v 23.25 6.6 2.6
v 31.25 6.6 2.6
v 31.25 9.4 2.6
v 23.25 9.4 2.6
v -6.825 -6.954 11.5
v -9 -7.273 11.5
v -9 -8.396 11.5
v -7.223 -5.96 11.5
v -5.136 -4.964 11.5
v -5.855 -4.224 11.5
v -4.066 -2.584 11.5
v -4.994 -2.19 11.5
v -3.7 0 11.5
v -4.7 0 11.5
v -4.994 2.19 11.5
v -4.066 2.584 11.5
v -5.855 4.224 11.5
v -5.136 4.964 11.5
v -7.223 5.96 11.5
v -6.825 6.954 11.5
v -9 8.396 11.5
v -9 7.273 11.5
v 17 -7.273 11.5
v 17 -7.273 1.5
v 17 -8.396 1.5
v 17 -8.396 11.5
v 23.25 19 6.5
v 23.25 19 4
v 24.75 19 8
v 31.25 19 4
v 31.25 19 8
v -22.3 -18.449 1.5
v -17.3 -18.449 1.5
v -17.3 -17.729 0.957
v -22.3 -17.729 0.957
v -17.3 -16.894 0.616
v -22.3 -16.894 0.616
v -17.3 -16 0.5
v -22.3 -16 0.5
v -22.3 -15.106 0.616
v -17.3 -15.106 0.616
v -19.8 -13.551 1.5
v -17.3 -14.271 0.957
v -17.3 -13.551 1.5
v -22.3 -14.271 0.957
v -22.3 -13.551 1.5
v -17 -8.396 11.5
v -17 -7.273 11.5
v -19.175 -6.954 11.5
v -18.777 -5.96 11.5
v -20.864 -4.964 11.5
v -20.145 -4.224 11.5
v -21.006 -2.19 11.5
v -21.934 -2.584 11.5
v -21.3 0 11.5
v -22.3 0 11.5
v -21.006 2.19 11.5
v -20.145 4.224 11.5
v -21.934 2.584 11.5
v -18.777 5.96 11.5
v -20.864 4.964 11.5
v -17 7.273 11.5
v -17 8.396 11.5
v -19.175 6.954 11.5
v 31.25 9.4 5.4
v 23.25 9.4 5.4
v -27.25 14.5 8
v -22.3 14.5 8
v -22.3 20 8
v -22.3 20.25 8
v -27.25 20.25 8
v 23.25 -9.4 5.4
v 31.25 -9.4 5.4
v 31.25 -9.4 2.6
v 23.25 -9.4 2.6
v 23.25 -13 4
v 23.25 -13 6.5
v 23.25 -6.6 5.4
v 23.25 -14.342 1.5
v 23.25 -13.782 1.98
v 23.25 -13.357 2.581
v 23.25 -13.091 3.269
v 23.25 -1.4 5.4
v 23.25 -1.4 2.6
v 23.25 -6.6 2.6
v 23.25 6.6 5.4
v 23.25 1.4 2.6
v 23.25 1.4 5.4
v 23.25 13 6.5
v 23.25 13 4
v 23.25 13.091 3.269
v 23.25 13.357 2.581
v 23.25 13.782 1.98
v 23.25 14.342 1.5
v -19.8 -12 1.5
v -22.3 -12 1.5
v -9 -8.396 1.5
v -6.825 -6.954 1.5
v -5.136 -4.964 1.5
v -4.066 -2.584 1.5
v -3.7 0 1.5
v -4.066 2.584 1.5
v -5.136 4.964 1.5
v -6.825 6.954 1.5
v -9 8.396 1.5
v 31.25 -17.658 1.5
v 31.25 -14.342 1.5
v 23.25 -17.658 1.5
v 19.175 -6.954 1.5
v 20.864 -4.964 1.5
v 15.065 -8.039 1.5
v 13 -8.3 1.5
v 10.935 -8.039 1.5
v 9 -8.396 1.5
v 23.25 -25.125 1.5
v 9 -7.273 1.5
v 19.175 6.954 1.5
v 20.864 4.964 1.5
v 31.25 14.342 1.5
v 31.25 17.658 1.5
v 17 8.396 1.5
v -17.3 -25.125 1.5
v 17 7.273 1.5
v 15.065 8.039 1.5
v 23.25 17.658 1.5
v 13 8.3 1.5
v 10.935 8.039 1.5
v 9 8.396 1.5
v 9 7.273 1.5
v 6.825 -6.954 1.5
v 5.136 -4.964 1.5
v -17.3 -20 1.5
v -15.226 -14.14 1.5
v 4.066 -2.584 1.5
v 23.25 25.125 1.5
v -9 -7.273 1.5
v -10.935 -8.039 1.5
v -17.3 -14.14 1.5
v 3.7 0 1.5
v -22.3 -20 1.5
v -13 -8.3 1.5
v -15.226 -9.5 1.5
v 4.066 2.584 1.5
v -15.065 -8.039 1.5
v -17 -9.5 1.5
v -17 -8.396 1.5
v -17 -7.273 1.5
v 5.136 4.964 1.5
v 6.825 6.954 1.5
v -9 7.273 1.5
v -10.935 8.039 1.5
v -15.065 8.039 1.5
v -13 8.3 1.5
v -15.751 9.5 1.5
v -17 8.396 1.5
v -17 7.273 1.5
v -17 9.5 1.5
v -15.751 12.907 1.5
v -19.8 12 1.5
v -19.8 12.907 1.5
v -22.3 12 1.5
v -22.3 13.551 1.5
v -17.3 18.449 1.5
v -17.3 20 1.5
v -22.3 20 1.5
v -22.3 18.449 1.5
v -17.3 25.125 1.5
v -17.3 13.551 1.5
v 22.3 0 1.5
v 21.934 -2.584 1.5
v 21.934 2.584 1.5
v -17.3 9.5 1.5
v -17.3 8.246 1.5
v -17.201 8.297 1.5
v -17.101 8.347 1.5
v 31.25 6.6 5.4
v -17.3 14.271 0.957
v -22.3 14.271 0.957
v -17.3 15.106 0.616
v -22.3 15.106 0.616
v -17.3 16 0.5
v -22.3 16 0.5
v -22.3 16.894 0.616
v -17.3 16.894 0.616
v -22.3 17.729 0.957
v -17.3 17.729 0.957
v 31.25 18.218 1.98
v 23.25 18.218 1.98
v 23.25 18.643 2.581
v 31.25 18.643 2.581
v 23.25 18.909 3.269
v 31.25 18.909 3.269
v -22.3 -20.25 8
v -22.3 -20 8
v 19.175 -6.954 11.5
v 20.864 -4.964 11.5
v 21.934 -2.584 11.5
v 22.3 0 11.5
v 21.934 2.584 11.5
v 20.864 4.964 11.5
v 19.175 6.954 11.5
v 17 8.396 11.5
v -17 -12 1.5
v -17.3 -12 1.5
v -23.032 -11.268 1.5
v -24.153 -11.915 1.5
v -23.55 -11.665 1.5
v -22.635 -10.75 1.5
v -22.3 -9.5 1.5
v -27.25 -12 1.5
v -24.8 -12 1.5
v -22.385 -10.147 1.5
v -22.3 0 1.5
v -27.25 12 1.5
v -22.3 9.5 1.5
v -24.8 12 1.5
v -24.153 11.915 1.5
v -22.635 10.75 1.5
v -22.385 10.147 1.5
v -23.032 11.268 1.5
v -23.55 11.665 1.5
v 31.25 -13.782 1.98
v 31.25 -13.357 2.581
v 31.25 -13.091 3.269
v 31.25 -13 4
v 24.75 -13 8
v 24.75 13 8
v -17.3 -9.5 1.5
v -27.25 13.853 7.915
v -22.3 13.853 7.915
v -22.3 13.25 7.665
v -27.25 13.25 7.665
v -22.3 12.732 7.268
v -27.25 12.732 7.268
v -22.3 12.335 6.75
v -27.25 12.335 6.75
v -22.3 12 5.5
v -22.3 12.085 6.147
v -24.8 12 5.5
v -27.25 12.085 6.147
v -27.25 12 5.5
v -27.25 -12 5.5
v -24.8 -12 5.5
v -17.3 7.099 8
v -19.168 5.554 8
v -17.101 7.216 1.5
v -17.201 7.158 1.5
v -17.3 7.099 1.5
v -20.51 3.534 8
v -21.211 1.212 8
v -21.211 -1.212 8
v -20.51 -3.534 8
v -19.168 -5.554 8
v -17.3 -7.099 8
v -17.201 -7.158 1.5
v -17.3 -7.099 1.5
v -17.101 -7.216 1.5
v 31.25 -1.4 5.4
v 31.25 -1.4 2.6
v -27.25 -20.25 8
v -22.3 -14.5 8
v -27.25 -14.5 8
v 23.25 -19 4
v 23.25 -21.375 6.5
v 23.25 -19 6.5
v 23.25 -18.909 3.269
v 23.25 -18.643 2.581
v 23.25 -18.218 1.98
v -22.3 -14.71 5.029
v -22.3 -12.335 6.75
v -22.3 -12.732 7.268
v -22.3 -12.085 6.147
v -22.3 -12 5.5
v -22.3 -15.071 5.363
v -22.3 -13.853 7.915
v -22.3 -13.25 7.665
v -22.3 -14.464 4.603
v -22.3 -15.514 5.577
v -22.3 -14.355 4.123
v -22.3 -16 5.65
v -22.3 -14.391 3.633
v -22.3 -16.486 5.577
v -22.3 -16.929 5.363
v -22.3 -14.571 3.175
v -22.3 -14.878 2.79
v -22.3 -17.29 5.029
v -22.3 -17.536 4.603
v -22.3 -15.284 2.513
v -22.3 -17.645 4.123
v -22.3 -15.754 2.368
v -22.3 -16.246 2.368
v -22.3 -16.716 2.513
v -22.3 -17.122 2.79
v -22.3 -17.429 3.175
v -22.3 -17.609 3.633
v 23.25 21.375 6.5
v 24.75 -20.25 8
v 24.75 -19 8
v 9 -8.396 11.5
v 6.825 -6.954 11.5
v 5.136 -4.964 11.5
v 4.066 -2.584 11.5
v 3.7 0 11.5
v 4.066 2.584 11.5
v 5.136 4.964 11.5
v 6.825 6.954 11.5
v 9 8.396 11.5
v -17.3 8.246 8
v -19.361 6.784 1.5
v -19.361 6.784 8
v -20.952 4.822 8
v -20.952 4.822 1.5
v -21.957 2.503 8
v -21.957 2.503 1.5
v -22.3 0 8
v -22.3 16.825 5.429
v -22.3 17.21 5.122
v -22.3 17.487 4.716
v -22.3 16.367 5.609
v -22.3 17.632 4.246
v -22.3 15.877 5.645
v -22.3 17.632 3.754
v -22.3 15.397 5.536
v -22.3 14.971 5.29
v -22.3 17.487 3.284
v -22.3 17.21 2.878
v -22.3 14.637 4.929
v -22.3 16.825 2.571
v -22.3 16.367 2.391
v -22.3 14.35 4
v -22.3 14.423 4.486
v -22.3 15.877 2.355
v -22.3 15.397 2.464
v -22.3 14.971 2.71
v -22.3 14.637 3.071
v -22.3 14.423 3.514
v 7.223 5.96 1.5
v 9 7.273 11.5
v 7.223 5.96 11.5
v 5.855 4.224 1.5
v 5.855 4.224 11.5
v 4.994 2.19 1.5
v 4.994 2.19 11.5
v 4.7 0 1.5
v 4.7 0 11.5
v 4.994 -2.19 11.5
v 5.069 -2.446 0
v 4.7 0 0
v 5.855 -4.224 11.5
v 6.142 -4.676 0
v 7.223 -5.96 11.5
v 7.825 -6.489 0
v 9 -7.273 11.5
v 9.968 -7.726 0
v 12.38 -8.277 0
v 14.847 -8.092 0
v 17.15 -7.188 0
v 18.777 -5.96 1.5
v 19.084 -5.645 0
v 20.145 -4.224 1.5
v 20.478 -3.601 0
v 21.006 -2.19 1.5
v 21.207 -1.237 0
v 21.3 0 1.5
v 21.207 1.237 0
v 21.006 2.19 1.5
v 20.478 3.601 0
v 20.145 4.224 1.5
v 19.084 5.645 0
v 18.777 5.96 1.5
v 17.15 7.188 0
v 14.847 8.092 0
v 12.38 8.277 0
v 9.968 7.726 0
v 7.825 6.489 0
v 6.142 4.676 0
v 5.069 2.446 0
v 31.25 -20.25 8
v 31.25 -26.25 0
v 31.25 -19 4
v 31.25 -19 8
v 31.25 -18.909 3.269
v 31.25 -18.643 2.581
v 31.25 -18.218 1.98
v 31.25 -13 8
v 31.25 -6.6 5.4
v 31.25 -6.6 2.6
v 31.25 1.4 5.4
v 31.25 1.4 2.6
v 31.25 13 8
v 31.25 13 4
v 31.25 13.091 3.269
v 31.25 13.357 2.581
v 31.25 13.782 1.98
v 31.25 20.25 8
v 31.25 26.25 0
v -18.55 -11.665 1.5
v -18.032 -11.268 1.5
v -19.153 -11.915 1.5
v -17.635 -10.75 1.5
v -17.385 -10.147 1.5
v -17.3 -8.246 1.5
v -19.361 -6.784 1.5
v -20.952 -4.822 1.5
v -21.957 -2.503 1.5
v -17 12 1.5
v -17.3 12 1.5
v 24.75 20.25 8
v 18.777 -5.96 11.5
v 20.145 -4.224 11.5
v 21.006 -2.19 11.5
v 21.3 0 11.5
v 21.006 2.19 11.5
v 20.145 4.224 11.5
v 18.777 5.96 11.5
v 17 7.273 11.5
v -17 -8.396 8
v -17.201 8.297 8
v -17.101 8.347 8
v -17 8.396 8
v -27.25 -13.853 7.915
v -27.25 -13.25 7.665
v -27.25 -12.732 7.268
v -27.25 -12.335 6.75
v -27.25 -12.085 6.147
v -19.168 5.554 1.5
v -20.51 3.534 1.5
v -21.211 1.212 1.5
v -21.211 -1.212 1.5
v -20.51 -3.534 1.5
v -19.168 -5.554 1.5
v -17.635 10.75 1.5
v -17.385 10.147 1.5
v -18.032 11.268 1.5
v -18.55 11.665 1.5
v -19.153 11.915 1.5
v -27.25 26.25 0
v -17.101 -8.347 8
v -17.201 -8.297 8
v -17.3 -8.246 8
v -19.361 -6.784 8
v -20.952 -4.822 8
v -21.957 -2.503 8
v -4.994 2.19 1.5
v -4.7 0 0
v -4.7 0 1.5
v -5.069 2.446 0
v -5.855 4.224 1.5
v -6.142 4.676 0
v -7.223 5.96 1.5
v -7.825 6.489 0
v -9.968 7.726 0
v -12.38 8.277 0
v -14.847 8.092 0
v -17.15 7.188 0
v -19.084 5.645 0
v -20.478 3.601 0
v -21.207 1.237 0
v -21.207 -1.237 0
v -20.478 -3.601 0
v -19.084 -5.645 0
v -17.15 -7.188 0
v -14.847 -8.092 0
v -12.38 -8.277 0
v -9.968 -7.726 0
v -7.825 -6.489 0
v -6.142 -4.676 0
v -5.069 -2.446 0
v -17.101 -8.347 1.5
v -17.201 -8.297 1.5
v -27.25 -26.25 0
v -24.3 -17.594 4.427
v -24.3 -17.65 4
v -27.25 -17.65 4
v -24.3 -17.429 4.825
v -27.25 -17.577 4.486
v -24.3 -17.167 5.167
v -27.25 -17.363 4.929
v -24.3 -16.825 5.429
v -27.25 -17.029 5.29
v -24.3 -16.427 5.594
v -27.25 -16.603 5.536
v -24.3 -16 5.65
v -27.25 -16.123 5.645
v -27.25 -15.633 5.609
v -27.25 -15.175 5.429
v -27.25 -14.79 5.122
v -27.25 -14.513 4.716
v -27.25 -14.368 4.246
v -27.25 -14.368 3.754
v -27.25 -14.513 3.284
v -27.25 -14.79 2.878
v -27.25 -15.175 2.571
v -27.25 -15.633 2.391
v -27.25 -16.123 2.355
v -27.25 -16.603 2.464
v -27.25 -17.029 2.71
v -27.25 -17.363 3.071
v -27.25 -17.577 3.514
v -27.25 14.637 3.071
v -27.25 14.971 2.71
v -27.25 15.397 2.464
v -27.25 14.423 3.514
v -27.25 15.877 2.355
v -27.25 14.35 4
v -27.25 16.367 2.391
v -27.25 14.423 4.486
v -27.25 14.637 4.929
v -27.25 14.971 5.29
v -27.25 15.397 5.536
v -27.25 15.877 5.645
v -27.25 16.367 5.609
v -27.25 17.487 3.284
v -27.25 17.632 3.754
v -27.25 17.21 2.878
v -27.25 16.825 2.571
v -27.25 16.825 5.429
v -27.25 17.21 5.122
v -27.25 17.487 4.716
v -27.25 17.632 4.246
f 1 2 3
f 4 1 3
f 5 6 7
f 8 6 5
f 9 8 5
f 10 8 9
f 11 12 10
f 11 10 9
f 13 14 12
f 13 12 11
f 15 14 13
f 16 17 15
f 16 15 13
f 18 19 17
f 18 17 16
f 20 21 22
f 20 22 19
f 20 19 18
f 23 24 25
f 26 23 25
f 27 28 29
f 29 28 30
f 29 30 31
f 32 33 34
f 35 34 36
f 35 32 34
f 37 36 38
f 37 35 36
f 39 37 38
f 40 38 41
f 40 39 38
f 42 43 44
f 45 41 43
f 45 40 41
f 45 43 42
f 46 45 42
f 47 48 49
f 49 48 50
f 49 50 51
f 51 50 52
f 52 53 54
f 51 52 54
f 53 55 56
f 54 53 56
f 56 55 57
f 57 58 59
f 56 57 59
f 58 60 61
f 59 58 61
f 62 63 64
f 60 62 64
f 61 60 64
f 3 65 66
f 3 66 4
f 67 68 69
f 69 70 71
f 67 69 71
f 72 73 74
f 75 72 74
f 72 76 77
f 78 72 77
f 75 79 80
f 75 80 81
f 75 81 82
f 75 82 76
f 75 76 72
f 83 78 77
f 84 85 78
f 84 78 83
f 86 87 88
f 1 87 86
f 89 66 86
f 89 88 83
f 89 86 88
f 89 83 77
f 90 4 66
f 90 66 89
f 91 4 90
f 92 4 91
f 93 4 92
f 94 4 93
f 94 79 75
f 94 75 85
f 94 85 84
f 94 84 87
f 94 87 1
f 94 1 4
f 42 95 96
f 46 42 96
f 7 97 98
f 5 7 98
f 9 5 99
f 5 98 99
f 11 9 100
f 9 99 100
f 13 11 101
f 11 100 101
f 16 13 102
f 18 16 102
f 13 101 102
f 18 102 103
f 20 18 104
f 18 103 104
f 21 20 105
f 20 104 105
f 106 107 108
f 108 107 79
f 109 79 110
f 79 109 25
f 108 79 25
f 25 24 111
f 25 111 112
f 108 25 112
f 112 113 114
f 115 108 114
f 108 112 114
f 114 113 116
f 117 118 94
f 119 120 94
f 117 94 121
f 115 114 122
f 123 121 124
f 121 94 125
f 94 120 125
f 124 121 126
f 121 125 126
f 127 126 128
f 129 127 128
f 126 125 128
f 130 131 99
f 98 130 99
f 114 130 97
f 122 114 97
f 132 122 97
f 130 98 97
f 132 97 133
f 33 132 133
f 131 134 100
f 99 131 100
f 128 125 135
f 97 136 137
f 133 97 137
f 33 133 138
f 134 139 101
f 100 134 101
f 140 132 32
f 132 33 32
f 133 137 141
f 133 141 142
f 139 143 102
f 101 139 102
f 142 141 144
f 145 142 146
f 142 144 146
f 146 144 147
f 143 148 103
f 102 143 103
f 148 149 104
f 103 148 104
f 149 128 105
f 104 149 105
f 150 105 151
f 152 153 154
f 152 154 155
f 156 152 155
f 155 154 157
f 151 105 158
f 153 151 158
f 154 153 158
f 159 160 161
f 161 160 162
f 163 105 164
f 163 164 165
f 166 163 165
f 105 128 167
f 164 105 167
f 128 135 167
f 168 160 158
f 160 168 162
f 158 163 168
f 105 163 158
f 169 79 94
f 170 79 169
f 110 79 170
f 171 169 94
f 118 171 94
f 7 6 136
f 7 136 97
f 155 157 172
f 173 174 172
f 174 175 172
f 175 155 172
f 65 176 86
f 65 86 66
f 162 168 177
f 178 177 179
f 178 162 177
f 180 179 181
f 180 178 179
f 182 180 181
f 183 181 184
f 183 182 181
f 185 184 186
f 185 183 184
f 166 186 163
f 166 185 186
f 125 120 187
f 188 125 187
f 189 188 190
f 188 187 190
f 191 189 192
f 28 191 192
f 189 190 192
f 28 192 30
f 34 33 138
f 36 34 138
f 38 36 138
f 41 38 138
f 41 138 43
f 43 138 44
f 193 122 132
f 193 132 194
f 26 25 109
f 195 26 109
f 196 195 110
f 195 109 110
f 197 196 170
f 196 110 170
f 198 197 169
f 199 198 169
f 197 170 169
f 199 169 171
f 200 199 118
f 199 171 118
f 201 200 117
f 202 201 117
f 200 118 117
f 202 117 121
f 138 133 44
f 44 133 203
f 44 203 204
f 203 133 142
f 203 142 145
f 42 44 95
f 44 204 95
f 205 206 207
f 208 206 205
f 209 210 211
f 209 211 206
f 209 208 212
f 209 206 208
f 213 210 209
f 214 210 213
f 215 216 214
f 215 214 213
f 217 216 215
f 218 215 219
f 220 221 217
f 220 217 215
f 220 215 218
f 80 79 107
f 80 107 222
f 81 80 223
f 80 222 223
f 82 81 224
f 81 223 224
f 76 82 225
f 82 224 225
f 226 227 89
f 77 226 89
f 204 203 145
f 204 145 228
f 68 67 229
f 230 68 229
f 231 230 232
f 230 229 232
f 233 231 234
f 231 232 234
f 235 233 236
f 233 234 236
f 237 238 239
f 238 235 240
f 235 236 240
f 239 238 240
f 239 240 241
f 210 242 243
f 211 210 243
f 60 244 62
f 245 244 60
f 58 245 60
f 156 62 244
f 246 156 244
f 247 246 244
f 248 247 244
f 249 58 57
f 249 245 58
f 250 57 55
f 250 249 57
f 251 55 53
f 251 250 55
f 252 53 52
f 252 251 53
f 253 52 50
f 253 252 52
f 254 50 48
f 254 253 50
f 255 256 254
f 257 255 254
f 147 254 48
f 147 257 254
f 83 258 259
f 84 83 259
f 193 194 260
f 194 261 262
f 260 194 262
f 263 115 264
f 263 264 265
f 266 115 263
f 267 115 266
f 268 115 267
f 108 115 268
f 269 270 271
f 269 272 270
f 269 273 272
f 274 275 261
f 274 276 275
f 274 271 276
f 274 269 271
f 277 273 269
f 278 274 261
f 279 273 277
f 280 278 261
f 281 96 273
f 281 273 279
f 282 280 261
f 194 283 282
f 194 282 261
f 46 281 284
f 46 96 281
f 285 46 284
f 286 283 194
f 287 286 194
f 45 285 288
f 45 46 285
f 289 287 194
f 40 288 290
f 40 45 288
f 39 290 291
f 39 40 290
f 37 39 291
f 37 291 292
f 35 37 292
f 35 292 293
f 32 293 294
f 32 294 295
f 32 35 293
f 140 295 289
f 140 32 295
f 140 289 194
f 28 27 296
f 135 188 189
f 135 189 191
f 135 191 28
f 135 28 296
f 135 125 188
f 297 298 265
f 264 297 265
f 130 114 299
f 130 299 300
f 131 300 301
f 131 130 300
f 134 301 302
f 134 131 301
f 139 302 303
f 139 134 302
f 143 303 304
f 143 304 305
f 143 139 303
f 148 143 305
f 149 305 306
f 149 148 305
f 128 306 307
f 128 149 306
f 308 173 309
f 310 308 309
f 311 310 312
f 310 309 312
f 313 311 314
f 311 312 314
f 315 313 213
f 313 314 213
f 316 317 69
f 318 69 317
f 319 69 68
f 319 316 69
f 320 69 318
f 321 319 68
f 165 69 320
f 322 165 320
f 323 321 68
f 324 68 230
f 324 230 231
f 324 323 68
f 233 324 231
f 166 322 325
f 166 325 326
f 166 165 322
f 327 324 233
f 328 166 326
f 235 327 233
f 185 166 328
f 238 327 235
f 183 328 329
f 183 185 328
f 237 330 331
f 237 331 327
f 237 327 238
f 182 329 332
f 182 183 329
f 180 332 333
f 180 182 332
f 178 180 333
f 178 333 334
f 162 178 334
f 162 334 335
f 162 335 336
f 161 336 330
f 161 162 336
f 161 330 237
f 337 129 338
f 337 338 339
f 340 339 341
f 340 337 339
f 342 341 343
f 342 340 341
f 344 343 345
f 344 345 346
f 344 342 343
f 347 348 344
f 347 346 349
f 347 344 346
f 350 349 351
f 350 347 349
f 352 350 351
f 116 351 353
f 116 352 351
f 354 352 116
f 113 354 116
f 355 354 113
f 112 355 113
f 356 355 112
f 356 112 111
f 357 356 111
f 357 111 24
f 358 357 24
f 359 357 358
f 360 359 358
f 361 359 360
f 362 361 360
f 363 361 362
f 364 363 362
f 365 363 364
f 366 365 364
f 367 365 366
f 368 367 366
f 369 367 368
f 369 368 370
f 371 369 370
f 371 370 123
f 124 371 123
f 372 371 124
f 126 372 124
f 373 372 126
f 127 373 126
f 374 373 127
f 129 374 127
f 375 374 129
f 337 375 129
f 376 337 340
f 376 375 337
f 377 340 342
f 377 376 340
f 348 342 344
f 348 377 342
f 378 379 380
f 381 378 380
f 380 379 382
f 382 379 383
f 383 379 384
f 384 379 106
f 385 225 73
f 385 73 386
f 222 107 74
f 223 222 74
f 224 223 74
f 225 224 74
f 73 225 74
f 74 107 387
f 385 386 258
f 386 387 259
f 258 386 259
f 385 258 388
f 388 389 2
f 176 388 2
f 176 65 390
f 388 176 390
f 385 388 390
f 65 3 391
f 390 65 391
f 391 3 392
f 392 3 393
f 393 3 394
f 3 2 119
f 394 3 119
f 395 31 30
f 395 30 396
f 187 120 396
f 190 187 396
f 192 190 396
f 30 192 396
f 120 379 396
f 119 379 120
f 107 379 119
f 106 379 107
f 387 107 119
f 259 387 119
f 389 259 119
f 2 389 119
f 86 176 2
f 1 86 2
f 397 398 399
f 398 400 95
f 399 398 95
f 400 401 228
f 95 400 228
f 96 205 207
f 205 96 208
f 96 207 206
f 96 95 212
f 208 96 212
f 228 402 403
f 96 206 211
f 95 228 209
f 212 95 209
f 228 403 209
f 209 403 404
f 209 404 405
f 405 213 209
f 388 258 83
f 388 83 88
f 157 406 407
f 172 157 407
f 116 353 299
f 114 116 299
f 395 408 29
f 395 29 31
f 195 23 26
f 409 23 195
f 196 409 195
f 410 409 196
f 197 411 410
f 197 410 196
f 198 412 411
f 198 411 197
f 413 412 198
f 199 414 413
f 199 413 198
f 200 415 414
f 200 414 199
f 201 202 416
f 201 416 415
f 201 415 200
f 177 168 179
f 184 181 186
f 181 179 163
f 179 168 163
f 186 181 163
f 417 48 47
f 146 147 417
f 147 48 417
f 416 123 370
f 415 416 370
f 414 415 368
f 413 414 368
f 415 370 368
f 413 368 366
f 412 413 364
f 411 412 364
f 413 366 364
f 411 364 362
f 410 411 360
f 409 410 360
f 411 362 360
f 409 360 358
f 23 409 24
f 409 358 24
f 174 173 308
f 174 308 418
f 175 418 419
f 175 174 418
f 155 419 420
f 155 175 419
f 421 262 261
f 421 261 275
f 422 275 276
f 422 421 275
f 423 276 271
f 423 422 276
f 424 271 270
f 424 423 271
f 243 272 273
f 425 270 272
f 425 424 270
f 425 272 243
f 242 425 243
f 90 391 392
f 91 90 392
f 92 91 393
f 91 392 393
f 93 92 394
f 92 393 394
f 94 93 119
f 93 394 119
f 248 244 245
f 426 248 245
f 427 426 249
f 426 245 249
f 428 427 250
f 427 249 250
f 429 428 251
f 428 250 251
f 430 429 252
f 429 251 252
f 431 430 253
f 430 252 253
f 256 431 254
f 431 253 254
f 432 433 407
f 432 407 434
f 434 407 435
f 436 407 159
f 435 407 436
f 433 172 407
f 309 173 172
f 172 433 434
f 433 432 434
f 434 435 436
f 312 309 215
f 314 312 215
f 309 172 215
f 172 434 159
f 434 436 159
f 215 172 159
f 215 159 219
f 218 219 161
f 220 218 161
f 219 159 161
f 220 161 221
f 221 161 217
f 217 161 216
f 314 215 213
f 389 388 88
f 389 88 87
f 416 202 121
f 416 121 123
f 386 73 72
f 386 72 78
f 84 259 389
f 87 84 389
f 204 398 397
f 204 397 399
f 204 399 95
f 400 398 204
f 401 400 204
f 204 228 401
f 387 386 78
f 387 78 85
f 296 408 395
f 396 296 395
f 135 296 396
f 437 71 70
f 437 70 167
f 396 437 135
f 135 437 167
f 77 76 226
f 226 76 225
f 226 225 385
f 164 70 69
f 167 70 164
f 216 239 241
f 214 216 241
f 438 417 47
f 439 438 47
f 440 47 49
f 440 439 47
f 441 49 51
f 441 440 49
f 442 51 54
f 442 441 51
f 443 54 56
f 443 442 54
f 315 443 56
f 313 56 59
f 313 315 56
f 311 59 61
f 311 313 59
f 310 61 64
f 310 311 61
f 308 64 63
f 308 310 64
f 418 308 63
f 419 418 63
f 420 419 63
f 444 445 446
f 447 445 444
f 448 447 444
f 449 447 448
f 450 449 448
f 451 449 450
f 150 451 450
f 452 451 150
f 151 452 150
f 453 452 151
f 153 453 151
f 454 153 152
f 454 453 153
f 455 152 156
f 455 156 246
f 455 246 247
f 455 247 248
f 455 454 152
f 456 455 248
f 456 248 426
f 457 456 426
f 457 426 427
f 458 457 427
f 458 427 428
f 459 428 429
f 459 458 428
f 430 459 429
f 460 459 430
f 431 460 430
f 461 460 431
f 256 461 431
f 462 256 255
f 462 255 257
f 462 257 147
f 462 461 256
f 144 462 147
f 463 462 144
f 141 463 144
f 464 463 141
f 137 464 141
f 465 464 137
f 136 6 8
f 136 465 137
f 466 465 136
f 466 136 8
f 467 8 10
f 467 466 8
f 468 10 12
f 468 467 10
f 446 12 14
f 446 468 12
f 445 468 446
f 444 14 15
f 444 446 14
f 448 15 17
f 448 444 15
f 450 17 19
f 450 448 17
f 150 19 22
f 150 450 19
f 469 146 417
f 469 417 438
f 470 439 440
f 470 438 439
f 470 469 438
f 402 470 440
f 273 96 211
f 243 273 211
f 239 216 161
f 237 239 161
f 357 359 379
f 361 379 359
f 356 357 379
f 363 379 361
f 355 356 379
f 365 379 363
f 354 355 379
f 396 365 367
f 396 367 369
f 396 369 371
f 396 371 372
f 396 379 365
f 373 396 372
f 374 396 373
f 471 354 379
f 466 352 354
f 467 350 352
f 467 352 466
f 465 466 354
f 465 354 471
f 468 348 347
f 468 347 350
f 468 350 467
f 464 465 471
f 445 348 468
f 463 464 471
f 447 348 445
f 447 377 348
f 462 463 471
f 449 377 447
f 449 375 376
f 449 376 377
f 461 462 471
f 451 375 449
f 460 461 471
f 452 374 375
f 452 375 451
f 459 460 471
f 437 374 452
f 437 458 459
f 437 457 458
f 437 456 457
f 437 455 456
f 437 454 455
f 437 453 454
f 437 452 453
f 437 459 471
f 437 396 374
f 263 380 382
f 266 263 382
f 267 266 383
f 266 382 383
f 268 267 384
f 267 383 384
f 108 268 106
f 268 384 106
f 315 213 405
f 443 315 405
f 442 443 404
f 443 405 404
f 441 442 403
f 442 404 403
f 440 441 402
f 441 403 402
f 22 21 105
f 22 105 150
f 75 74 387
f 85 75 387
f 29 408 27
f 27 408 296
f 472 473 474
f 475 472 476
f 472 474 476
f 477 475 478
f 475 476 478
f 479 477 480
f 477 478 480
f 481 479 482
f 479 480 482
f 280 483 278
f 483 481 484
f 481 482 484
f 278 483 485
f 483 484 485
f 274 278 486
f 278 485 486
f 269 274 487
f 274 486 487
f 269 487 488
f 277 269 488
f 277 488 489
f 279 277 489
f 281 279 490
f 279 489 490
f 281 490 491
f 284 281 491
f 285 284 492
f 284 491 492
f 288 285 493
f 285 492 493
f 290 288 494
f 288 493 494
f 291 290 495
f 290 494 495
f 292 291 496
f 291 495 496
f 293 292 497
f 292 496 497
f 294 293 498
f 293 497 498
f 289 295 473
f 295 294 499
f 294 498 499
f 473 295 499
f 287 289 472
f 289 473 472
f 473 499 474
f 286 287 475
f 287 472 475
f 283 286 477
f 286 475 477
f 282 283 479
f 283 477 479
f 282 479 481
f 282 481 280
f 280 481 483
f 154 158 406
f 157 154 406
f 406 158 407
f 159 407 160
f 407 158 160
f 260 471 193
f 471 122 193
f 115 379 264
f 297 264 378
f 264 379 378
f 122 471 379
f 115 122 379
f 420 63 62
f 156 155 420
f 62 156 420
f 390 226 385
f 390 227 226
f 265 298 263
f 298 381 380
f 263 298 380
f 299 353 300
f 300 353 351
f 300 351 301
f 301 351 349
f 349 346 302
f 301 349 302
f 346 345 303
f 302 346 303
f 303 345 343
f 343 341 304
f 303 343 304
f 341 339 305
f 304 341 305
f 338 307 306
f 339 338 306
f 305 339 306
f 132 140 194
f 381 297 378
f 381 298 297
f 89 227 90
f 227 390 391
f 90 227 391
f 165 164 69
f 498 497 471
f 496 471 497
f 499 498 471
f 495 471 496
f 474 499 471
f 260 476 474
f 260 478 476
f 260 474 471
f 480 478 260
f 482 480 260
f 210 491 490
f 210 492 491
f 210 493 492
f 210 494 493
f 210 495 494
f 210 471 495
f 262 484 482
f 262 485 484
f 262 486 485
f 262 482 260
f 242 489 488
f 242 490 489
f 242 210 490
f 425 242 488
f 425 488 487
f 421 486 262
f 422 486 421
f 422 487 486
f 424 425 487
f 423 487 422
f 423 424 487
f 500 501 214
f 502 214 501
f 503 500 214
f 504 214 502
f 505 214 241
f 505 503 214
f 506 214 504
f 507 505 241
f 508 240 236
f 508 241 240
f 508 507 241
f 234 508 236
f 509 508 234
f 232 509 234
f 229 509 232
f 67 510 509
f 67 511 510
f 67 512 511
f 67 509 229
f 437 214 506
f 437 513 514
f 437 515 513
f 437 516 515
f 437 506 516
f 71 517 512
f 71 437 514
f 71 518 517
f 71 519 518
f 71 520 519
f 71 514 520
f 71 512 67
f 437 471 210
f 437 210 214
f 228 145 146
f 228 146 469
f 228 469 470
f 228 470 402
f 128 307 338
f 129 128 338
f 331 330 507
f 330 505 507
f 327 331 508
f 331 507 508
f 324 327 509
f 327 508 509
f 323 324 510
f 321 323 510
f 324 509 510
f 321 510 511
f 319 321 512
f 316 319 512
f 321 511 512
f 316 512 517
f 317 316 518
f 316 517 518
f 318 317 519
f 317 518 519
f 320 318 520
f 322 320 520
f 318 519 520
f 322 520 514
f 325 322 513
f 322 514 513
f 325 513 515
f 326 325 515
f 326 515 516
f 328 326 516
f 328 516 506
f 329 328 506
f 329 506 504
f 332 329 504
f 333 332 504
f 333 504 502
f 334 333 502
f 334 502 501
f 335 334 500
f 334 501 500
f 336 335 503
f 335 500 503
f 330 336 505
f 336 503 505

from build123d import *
from build123d.topology import SkipClean

# Parameters (mm, degrees)
ESBO_O1_R                 = 8.3
RESSALTO_EXTRUS_O1_DEPTH  = 1.5
RESSALTO_EXTRUS_O2_DEPTH  = 6
ESBO_O3_W                 = 2.8
ESBO_O3_H                 = 2.8
CORTE_EXTRUS_O1_DEPTH     = 37.142080737
ESBO_O4_W                 = 2.8
ESBO_O4_H                 = 2.8
CORTE_EXTRUS_O2_DEPTH     = 53.08166664
ESBO_O6_W                 = 5
ESBO_O6_H                 = 25
RESSALTO_EXTRUS_O5_DEPTH  = 7.5
ESBO_O7_W                 = 2.8
ESBO_O7_H                 = 2.8
CORTE_EXTRUS_O3_DEPTH     = 60
RESSALTO_EXTRUS_O3_DEPTH  = 10
ESBO_O8_W                 = 60
ESBO_O8_H                 = 52.5
ESBO_O8_R                 = 8.3
RESSALTO_EXTRUS_O6_DEPTH  = 1.5
CORTE_EXTRUS_O4_DEPTH     = 42.098205557
RESSALTO_EXTRUS_O7_DEPTH  = 6.5
ESBO_O14_W                = 5.7
ESBO_O14_H                = 52.5
CORTE_EXTRUS_O8_DEPTH     = 4.5
CORTE_EXTRUS_O9_DEPTH     = 41.657871317
CORTE_EXTRUS_O13_DEPTH    = 6.25
CORTE_EXTRUS_O14_DEPTH    = 6.25
ESBO_O12_R                = 1.65
CORTE_EXTRUS_O15_DEPTH    = 4.5
CORTE_EXTRUS_O17_DEPTH    = 62.398717413
ESBO_O20_R                = 3.5
CORTE_EXTRUS_O18_DEPTH    = 5
RESSALTO_EXTRUS_O8_START  = 2.95
ESBO_O21_R                = 1.65
RESSALTO_EXTRUS_O8_DEPTH  = 2.95
ESBO_O22_W                = 2.8
ESBO_O22_H                = 2.8
RESSALTO_EXTRUS_O9_DEPTH  = 1.25
CORTE_EXTRUS_O19_DEPTH    = 6
ESBO_O24_W                = 8
ESBO_O24_H                = 50.25
RESSALTO_EXTRUS_O10_DEPTH = 6.5
CORTE_EXTRUS_O20_DEPTH    = 62.222570389
CORTE_EXTRUS_O21_REACH    = 67.143
ESBO_O26_W                = 2.8
ESBO_O26_H                = 2.8
CORTE_EXTRUS_O22_REACH    = 67.143
CORTE_EXTRUS_O23_DEPTH    = 6.5
CORTE_EXTRUS_O24_DEPTH    = 6.5
CORTE_EXTRUS_O25_START    = -6.5
CORTE_EXTRUS_O25_DEPTH    = 6.5
CORTE_EXTRUS_O26_DEPTH    = 4.95


with BuildPart() as part:
    # Esboço1 → Ressalto-extrusão1 (new body)
    with BuildSketch(Plane.XY):
        Polygon((-25, -12.5), (-25, 12.5), (25, 12.5), (25, -12.5), (15, -12.5), (-15, -12.5), align=None)
        with Locations((-13, 0)):
            Circle(ESBO_O1_R, mode=Mode.SUBTRACT)
        with Locations(Location((13, 0, 0), (0, 0, 180))):
            Circle(ESBO_O1_R, mode=Mode.SUBTRACT)
    extrude(amount=RESSALTO_EXTRUS_O1_DEPTH)

    # Esboço2 → Ressalto-extrusão2 (add)
    with BuildSketch(Plane.XY.offset(1.5)):
        Polygon((-20, -12.5), (-25, -12.5), (-25, -2.5), (-22, -2.5), (-22, -9.5), (-15, -9.5), (-15, -12.5), align=None)
        Polygon((22, -2.5), (22, -9.5), (15, -9.5), (15, -12.5), (20, -12.5), (25, -12.5), (25, -2.5), align=None)
        Polygon((20, 12.5), (25, 12.5), (25, 2.5), (22, 2.5), (22, 9.5), (15, 9.5), (15, 12.5), align=None)
        Polygon((-22, 2.5), (-22, 9.5), (-15, 9.5), (-15, 12.5), (-20, 12.5), (-25, 12.5), (-25, 2.5), align=None)
    extrude(amount=RESSALTO_EXTRUS_O2_DEPTH)

    # Esboço3 → Corte-extrusão1 (cut, through all)
    with BuildSketch(Plane.XZ.offset(12.5)):
        with Locations((-20, 3.75)):
            Rectangle(ESBO_O3_W, ESBO_O3_H)
        with Locations((20, 3.75)):
            Rectangle(ESBO_O3_W, ESBO_O3_H)
    extrude(amount=-CORTE_EXTRUS_O1_DEPTH, mode=Mode.SUBTRACT)

    # Esboço4 → Corte-extrusão2 (cut, through all)
    with BuildSketch(Plane.ZY.offset(25)):
        with Locations((3.75, 7.5)):
            Rectangle(ESBO_O4_W, ESBO_O4_H)
        with Locations((3.75, -7.5)):
            Rectangle(ESBO_O4_W, ESBO_O4_H)
    extrude(amount=-CORTE_EXTRUS_O2_DEPTH, mode=Mode.SUBTRACT)

    # Esboço6 → Ressalto-extrusão5 (add)
    with BuildSketch(Plane(origin=(0, 0, 0), x_dir=(-1, 0, 0), z_dir=(0, 0, -1))):
        with Locations((-27.5, 0)):
            Rectangle(ESBO_O6_W, ESBO_O6_H)
        with Locations((27.5, 0)):
            Rectangle(ESBO_O6_W, ESBO_O6_H)
    extrude(amount=-RESSALTO_EXTRUS_O5_DEPTH)

    # Esboço7 → Corte-extrusão3 (cut)
    with BuildSketch(Plane(origin=(30, 0, 0), x_dir=(0, 0, -1), z_dir=(1, 0, 0))):
        with Locations((-3.75, -7.5)):
            Rectangle(ESBO_O7_W, ESBO_O7_H)
        with Locations((-3.75, 7.5)):
            Rectangle(ESBO_O7_W, ESBO_O7_H)
    extrude(amount=-CORTE_EXTRUS_O3_DEPTH, mode=Mode.SUBTRACT)

    # Esboço5 → Ressalto-extrusão3 (add)
    with SkipClean():  # the faces are left unmerged after this step: merging them gives an invalid solid
        with BuildSketch(Plane.XY.offset(1.5)):
            with BuildLine():
                Line((-9, -7.272551134), (-9, -8.395832299))
                ThreePointArc((-9, -8.395832299), (-3.7, 0), (-9, 8.395832299))
                Line((-9, 8.395832299), (-9, 7.272551134))
                ThreePointArc((-9, 7.272551134), (-4.7, 0), (-9, -7.272551134))
            make_face()
            with BuildLine():
                Line((-17, -7.272551134), (-17, -8.395832299))
                ThreePointArc((-17, -8.395832299), (-22.3, 0), (-17, 8.395832299))
                Line((-17, 8.395832299), (-17, 7.272551134))
                ThreePointArc((-17, 7.272551134), (-21.3, 0), (-17, -7.272551134))
            make_face()
            with BuildLine():
                Line((9, -7.272551134), (9, -8.395832299))
                ThreePointArc((9, -8.395832299), (3.7, 0), (9, 8.395832299))
                Line((9, 8.395832299), (9, 7.272551134))
                ThreePointArc((9, 7.272551134), (4.7, 0), (9, -7.272551134))
            make_face()
            with BuildLine():
                Line((17, 8.395832299), (17, 7.272551134))
                ThreePointArc((17, 7.272551134), (21.3, 0), (17, -7.272551134))
                Line((17, -7.272551134), (17, -8.395832299))
                ThreePointArc((17, -8.395832299), (22.3, 0), (17, 8.395832299))
            make_face()
        extrude(amount=RESSALTO_EXTRUS_O3_DEPTH)

    # Esboço8 → Ressalto-extrusão6 (add)
    with SkipClean():  # the faces are left unmerged after this step: merging them gives an invalid solid
        with BuildSketch(Plane(origin=(0, 0, 0), x_dir=(-1, 0, 0), z_dir=(0, 0, -1))):
            Rectangle(ESBO_O8_W, ESBO_O8_H)
            with Locations(Location((13, 0, 0), (0, 0, 298.811379709))):
                Circle(ESBO_O8_R, mode=Mode.SUBTRACT)
            with Locations((-13, 0)):
                Circle(ESBO_O8_R, mode=Mode.SUBTRACT)
        extrude(amount=-RESSALTO_EXTRUS_O6_DEPTH)

    # Esboço9 → Corte-extrusão4 (cut, through all)
    with SkipClean():  # the faces are left unmerged after this step: merging them gives an invalid solid
        with BuildSketch(Plane.XY.offset(1.5)):
            Polygon((-15, -12.5), (-15, -9.5), (-22, -9.5), (-22, -2.5), (-25, -2.5), (-25, 2.5), (-22, 2.5), (-22, 9.5), (-15, 9.5), (-15, 12.5), (-30, 12.5), (-30, -12.5), align=None)
        extrude(amount=CORTE_EXTRUS_O4_DEPTH, mode=Mode.SUBTRACT)

    # Esboço10 → Ressalto-extrusão7 (add)
    with SkipClean():  # the faces are left unmerged after this step: merging them gives an invalid solid
        with BuildSketch(Plane.XY.offset(1.5)):
            Polygon((-24.3, -26.25), (-24.3, 26.25), (-22.3, 26.25), (-17.3, 26.25), (-17.3, 20), (-22.3, 20), (-22.3, 12), (-17.3, 12), (-17.3, -12), (-22.3, -12), (-22.3, -20), (-17.3, -20), (-17.3, -26.25), (-22.3, -26.25), align=None)
        extrude(amount=RESSALTO_EXTRUS_O7_DEPTH)

    # Esboço14 → Corte-extrusão8 (cut)
    with SkipClean():  # the faces are left unmerged after this step: merging them gives an invalid solid
        with BuildSketch(Plane.XY.offset(1.5)):
            with Locations((-27.15, 0)):
                Rectangle(ESBO_O14_W, ESBO_O14_H)
        extrude(amount=-CORTE_EXTRUS_O8_DEPTH, mode=Mode.SUBTRACT)

    # Esboço15 → Corte-extrusão9 (cut, through all)
    with SkipClean():  # the faces are left unmerged after this step: merging them gives an invalid solid
        with BuildSketch(Plane.XY.offset(8)):
            with BuildLine():
                Line((-17.3, -7.09929574), (-17.3, 7.09929574))
                ThreePointArc((-17.3, 7.09929574), (-21.3, 0), (-17.3, -7.09929574))
            make_face()
        extrude(amount=-CORTE_EXTRUS_O9_DEPTH, mode=Mode.SUBTRACT)

    # Esboço11 → Corte-extrusão13 (cut)
    with SkipClean():  # the faces are left unmerged after this step: merging them gives an invalid solid
        with BuildSketch(Plane.XZ.offset(26.25)):
            Polygon((-22.3, 8), (-17.3, 8), (-17.3, 1.5), align=None)
        extrude(amount=-CORTE_EXTRUS_O13_DEPTH, mode=Mode.SUBTRACT)

    # Esboço17 → Corte-extrusão14 (cut)
    with SkipClean():  # the faces are left unmerged after this step: merging them gives an invalid solid
        with BuildSketch(Plane(origin=(0, 26.25, 0), x_dir=(1, 0, 0), z_dir=(0, 1, 0))):
            Polygon((-17.3, -1.5), (-17.3, -8), (-22.3, -8), align=None)
        extrude(amount=-CORTE_EXTRUS_O14_DEPTH, mode=Mode.SUBTRACT)

    # Esboço12 → Corte-extrusão15 (cut)
    with SkipClean():  # the faces are left unmerged after this step: merging them gives an invalid solid
        with BuildSketch(Plane.ZY.offset(24.3)):
            with Locations(Location((4, 16, 0), (0, 0, 270))):
                Circle(ESBO_O12_R)
            with Locations((4, -16)):
                Circle(ESBO_O12_R)
        extrude(amount=-CORTE_EXTRUS_O15_DEPTH, mode=Mode.SUBTRACT)

    # Esboço19 → Corte-extrusão17 (cut, through all)
    with SkipClean():  # the faces are left unmerged after this step: merging them gives an invalid solid
        with BuildSketch(Plane.ZY.offset(24.3)):
            Polygon((0, 26.25), (8, 26.25), (8, 20.25), align=None)
            Polygon((8, -20.25), (0, -26.25), (8, -26.25), align=None)
        extrude(amount=-CORTE_EXTRUS_O17_DEPTH, mode=Mode.SUBTRACT)

    # Esboço20 → Corte-extrusão18 (cut)
    with SkipClean():  # the faces are left unmerged after this step: merging them gives an invalid solid
        with BuildSketch(Plane(origin=(-22.3, 0, 0), x_dir=(0, 0, -1), z_dir=(1, 0, 0))):
            with Locations((-4, -16)):
                Circle(ESBO_O20_R)
            with Locations((-4, 16)):
                Circle(ESBO_O20_R)
        extrude(amount=CORTE_EXTRUS_O18_DEPTH, mode=Mode.SUBTRACT)

    # Esboço21 → Ressalto-extrusão8 (add)
    with SkipClean():  # the faces are left unmerged after this step: merging them gives an invalid solid
        with BuildSketch(Plane.ZY.offset(24.3).offset(RESSALTO_EXTRUS_O8_START)):
            Polygon((0, 26.25), (0, -26.25), (8, -20.25), (8, 20.25), align=None)
            with Locations(Location((4, -16, 0), (0, 0, 270))):
                Circle(ESBO_O21_R, mode=Mode.SUBTRACT)
            with Locations(Location((4, 16, 0), (0, 0, 270))):
                Circle(ESBO_O21_R, mode=Mode.SUBTRACT)
        extrude(amount=-RESSALTO_EXTRUS_O8_DEPTH)

    # Esboço22 → Ressalto-extrusão9 (add)
    with SkipClean():  # the faces are left unmerged after this step: merging them gives an invalid solid
        with BuildSketch(Plane(origin=(30, 0, 0), x_dir=(0, 0, -1), z_dir=(1, 0, 0))):
            Polygon((-1.5, -25.125), (0, -26.25), (0, 26.25), (-1.5, 25.125), (-1.5, 12.5), (-7.5, 12.5), (-7.5, -12.5), (-1.5, -12.5), align=None)
            with Locations((-3.75, -7.5)):
                Rectangle(ESBO_O22_W, ESBO_O22_H, mode=Mode.SUBTRACT)
            with Locations((-3.75, 7.5)):
                Rectangle(ESBO_O22_W, ESBO_O22_H, mode=Mode.SUBTRACT)
        extrude(amount=RESSALTO_EXTRUS_O9_DEPTH)

    # Esboço23 → Corte-extrusão19 (cut)
    with SkipClean():  # the faces are left unmerged after this step: merging them gives an invalid solid
        with BuildSketch(Plane.XY.offset(7.5)):
            Polygon((25, -2.5), (22, -2.5), (22, -9.5), (15, -9.5), (15, -12.5), (31.25, -12.5), (31.25, 12.5), (15, 12.5), (15, 9.5), (22, 9.5), (22, 2.5), (25, 2.5), align=None)
        extrude(amount=-CORTE_EXTRUS_O19_DEPTH, mode=Mode.SUBTRACT)

    # Esboço24 → Ressalto-extrusão10 (add)
    with SkipClean():  # the faces are left unmerged after this step: merging them gives an invalid solid
        with BuildSketch(Plane.XY.offset(1.5)):
            with Locations((27.25, 0)):
                Rectangle(ESBO_O24_W, ESBO_O24_H)
        extrude(amount=RESSALTO_EXTRUS_O10_DEPTH)

    # Esboço25 → Corte-extrusão20 (cut, through all)
    with SkipClean():  # the faces are left unmerged after this step: merging them gives an invalid solid
        with BuildSketch(Plane(origin=(0, 25.125, 0), x_dir=(1, 0, 0), z_dir=(0, 1, 0))):
            Polygon((23.25, -6.5), (23.25, -8), (24.75, -8), align=None)
        extrude(amount=-CORTE_EXTRUS_O20_DEPTH, mode=Mode.SUBTRACT)

    # Esboço26 → Corte-extrusão21 (cut, up to next)
    with BuildSketch(Plane(origin=(31.25, 0, 0), x_dir=(0, 0, -1), z_dir=(1, 0, 0)), mode=Mode.PRIVATE) as corte_extrus_o21_sk1:
        with Locations((-4, 0)):
            Rectangle(ESBO_O26_W, ESBO_O26_H)
    corte_extrus_o21_tool1 = extrude(corte_extrus_o21_sk1.sketch, amount=-CORTE_EXTRUS_O21_REACH, mode=Mode.PRIVATE) & part.part
    # Esboço26 → Corte-extrusão21 (cut, up to next)
    with BuildSketch(Plane(origin=(31.25, 0, 0), x_dir=(0, 0, -1), z_dir=(1, 0, 0)), mode=Mode.PRIVATE) as corte_extrus_o21_sk2:
        with Locations((-4, -8)):
            Rectangle(ESBO_O26_W, ESBO_O26_H)
    corte_extrus_o21_tool2 = extrude(corte_extrus_o21_sk2.sketch, amount=-CORTE_EXTRUS_O21_REACH, mode=Mode.PRIVATE) & part.part
    # Esboço26 → Corte-extrusão21 (cut, up to next)
    with BuildSketch(Plane(origin=(31.25, 0, 0), x_dir=(0, 0, -1), z_dir=(1, 0, 0)), mode=Mode.PRIVATE) as corte_extrus_o21_sk3:
        with Locations((-4, 8)):
            Rectangle(ESBO_O26_W, ESBO_O26_H)
    corte_extrus_o21_tool3 = extrude(corte_extrus_o21_sk3.sketch, amount=-CORTE_EXTRUS_O21_REACH, mode=Mode.PRIVATE) & part.part
    add(corte_extrus_o21_tool1.solids().sort_by_distance((31.25, 0, 4))[0], mode=Mode.SUBTRACT)
    add(corte_extrus_o21_tool2.solids().sort_by_distance((31.25, -8, 4))[0], mode=Mode.SUBTRACT)
    add(corte_extrus_o21_tool3.solids().sort_by_distance((31.25, 8, 4))[0], mode=Mode.SUBTRACT)

    # Esboço27 → Corte-extrusão22 (cut, up to next)
    with BuildSketch(Plane(origin=(31.25, 0, 0), x_dir=(0, 0, -1), z_dir=(1, 0, 0)), mode=Mode.PRIVATE) as corte_extrus_o22_sk1:
        with BuildLine():
            Line((-4, 19), (-8, 19))
            Line((-8, 19), (-8, 13))
            Line((-8, 13), (-4, 13))
            ThreePointArc((-4, 13), (-2.581362835, 13.356617963), (-1.5, 14.341687605))
            Line((-1.5, 14.341687605), (-1.5, 17.658312395))
            ThreePointArc((-1.5, 17.658312395), (-2.581362835, 18.643382037), (-4, 19))
        make_face()
    corte_extrus_o22_tool1 = extrude(corte_extrus_o22_sk1.sketch, amount=-CORTE_EXTRUS_O22_REACH, mode=Mode.PRIVATE) & part.part
    # Esboço27 → Corte-extrusão22 (cut, up to next)
    with BuildSketch(Plane(origin=(31.25, 0, 0), x_dir=(0, 0, -1), z_dir=(1, 0, 0)), mode=Mode.PRIVATE) as corte_extrus_o22_sk2:
        Polygon((-8, -20.25), (-8, -25.125), (-1.5, -25.125), align=None)
    corte_extrus_o22_tool2 = extrude(corte_extrus_o22_sk2.sketch, amount=-CORTE_EXTRUS_O22_REACH, mode=Mode.PRIVATE) & part.part
    # Esboço27 → Corte-extrusão22 (cut, up to next)
    with BuildSketch(Plane(origin=(31.25, 0, 0), x_dir=(0, 0, -1), z_dir=(1, 0, 0)), mode=Mode.PRIVATE) as corte_extrus_o22_sk3:
        Polygon((-8, 25.125), (-8, 20.25), (-1.5, 25.125), align=None)
    corte_extrus_o22_tool3 = extrude(corte_extrus_o22_sk3.sketch, amount=-CORTE_EXTRUS_O22_REACH, mode=Mode.PRIVATE) & part.part
    # Esboço27 → Corte-extrusão22 (cut, up to next)
    with BuildSketch(Plane(origin=(31.25, 0, 0), x_dir=(0, 0, -1), z_dir=(1, 0, 0)), mode=Mode.PRIVATE) as corte_extrus_o22_sk4:
        with BuildLine():
            Line((-4, -13), (-8, -13))
            Line((-8, -13), (-8, -19))
            Line((-8, -19), (-4, -19))
            ThreePointArc((-4, -19), (-2.581362835, -18.643382037), (-1.5, -17.658312395))
            Line((-1.5, -17.658312395), (-1.5, -14.341687605))
            ThreePointArc((-1.5, -14.341687605), (-2.581362835, -13.356617963), (-4, -13))
        make_face()
    corte_extrus_o22_tool4 = extrude(corte_extrus_o22_sk4.sketch, amount=-CORTE_EXTRUS_O22_REACH, mode=Mode.PRIVATE) & part.part
    add(corte_extrus_o22_tool1.solids().sort_by_distance((31.25, 16, 4.892695))[0], mode=Mode.SUBTRACT)
    add(corte_extrus_o22_tool2.solids().sort_by_distance((31.25, -23.5, 5.833333))[0], mode=Mode.SUBTRACT)
    add(corte_extrus_o22_tool3.solids().sort_by_distance((31.25, 23.5, 5.833333))[0], mode=Mode.SUBTRACT)
    add(corte_extrus_o22_tool4.solids().sort_by_distance((31.25, -16, 4.892695))[0], mode=Mode.SUBTRACT)

    # Esboço28 → Corte-extrusão23 (cut)
    with SkipClean():  # the faces are left unmerged after this step: merging them gives an invalid solid
        with BuildSketch(Plane.XY.offset(8)):
            with BuildLine():
                Line((-27.25, 12), (-27.25, -12))
                Line((-27.25, -12), (-24.8, -12))
                ThreePointArc((-24.8, -12), (-23.032233047, -11.267766953), (-22.3, -9.5))
                Line((-22.3, -9.5), (-22.3, 9.5))
                ThreePointArc((-22.3, 9.5), (-23.032233047, 11.267766953), (-24.8, 12))
                Line((-24.8, 12), (-27.25, 12))
            make_face()
        extrude(amount=-CORTE_EXTRUS_O23_DEPTH, mode=Mode.SUBTRACT)

    # Esboço29 → Corte-extrusão24 (cut)
    with SkipClean():  # the faces are left unmerged after this step: merging them gives an invalid solid
        with BuildSketch(Plane.XY.offset(8)):
            with BuildLine():
                Line((-19.8, -12), (-19.8, -12.44923286))
                Line((-19.8, -12.44923286), (-19.8, -14.139655276))
                Line((-19.8, -14.139655276), (-15.225886581, -14.139655276))
                Line((-15.225886581, -14.139655276), (-15.225886581, -9.5))
                Line((-15.225886581, -9.5), (-17.3, -9.5))
                ThreePointArc((-17.3, -9.5), (-18.032233047, -11.267766953), (-19.8, -12))
            make_face()
            with BuildLine():
                Line((-19.8, 12), (-19.8, 12.907103379))
                Line((-19.8, 12.907103379), (-15.750500434, 12.907103379))
                Line((-15.750500434, 12.907103379), (-15.750500434, 9.5))
                Line((-15.750500434, 9.5), (-17.3, 9.5))
                ThreePointArc((-17.3, 9.5), (-18.032233047, 11.267766953), (-19.8, 12))
            make_face()
        extrude(amount=-CORTE_EXTRUS_O24_DEPTH, mode=Mode.SUBTRACT)

    # Esboço30 → Corte-extrusão25 (cut)
    with SkipClean():  # the faces are left unmerged after this step: merging them gives an invalid solid
        with BuildSketch(Plane.XY.offset(8).offset(CORTE_EXTRUS_O25_START)):
            with BuildLine():
                Line((-27.25, 12), (-17, 12))
                Line((-17, 12), (-17, 8.395832299))
                ThreePointArc((-17, 8.395832299), (-22.3, 0), (-17, -8.395832299))
                Line((-17, -8.395832299), (-17, -12))
                Line((-17, -12), (-27.25, -12))
                Line((-27.25, -12), (-27.25, 12))
            make_face()
        extrude(amount=CORTE_EXTRUS_O25_DEPTH, mode=Mode.SUBTRACT)

    # Esboço31 → Corte-extrusão26 (cut)
    with SkipClean():  # the faces are left unmerged after this step: merging them gives an invalid solid
        with BuildSketch(Plane.ZY.offset(27.25)):
            with BuildLine():
                Line((5.5, -12), (8, -12))
                Line((8, -12), (8, -14.5))
                ThreePointArc((8, -14.5), (7.267766953, -12.732233047), (5.5, -12))
            make_face()
            with BuildLine():
                Line((5.5, 12), (8, 12))
                Line((8, 12), (8, 14.5))
                ThreePointArc((8, 14.5), (7.267766953, 12.732233047), (5.5, 12))
            make_face()
        extrude(amount=-CORTE_EXTRUS_O26_DEPTH, mode=Mode.SUBTRACT)


solid = part.part
